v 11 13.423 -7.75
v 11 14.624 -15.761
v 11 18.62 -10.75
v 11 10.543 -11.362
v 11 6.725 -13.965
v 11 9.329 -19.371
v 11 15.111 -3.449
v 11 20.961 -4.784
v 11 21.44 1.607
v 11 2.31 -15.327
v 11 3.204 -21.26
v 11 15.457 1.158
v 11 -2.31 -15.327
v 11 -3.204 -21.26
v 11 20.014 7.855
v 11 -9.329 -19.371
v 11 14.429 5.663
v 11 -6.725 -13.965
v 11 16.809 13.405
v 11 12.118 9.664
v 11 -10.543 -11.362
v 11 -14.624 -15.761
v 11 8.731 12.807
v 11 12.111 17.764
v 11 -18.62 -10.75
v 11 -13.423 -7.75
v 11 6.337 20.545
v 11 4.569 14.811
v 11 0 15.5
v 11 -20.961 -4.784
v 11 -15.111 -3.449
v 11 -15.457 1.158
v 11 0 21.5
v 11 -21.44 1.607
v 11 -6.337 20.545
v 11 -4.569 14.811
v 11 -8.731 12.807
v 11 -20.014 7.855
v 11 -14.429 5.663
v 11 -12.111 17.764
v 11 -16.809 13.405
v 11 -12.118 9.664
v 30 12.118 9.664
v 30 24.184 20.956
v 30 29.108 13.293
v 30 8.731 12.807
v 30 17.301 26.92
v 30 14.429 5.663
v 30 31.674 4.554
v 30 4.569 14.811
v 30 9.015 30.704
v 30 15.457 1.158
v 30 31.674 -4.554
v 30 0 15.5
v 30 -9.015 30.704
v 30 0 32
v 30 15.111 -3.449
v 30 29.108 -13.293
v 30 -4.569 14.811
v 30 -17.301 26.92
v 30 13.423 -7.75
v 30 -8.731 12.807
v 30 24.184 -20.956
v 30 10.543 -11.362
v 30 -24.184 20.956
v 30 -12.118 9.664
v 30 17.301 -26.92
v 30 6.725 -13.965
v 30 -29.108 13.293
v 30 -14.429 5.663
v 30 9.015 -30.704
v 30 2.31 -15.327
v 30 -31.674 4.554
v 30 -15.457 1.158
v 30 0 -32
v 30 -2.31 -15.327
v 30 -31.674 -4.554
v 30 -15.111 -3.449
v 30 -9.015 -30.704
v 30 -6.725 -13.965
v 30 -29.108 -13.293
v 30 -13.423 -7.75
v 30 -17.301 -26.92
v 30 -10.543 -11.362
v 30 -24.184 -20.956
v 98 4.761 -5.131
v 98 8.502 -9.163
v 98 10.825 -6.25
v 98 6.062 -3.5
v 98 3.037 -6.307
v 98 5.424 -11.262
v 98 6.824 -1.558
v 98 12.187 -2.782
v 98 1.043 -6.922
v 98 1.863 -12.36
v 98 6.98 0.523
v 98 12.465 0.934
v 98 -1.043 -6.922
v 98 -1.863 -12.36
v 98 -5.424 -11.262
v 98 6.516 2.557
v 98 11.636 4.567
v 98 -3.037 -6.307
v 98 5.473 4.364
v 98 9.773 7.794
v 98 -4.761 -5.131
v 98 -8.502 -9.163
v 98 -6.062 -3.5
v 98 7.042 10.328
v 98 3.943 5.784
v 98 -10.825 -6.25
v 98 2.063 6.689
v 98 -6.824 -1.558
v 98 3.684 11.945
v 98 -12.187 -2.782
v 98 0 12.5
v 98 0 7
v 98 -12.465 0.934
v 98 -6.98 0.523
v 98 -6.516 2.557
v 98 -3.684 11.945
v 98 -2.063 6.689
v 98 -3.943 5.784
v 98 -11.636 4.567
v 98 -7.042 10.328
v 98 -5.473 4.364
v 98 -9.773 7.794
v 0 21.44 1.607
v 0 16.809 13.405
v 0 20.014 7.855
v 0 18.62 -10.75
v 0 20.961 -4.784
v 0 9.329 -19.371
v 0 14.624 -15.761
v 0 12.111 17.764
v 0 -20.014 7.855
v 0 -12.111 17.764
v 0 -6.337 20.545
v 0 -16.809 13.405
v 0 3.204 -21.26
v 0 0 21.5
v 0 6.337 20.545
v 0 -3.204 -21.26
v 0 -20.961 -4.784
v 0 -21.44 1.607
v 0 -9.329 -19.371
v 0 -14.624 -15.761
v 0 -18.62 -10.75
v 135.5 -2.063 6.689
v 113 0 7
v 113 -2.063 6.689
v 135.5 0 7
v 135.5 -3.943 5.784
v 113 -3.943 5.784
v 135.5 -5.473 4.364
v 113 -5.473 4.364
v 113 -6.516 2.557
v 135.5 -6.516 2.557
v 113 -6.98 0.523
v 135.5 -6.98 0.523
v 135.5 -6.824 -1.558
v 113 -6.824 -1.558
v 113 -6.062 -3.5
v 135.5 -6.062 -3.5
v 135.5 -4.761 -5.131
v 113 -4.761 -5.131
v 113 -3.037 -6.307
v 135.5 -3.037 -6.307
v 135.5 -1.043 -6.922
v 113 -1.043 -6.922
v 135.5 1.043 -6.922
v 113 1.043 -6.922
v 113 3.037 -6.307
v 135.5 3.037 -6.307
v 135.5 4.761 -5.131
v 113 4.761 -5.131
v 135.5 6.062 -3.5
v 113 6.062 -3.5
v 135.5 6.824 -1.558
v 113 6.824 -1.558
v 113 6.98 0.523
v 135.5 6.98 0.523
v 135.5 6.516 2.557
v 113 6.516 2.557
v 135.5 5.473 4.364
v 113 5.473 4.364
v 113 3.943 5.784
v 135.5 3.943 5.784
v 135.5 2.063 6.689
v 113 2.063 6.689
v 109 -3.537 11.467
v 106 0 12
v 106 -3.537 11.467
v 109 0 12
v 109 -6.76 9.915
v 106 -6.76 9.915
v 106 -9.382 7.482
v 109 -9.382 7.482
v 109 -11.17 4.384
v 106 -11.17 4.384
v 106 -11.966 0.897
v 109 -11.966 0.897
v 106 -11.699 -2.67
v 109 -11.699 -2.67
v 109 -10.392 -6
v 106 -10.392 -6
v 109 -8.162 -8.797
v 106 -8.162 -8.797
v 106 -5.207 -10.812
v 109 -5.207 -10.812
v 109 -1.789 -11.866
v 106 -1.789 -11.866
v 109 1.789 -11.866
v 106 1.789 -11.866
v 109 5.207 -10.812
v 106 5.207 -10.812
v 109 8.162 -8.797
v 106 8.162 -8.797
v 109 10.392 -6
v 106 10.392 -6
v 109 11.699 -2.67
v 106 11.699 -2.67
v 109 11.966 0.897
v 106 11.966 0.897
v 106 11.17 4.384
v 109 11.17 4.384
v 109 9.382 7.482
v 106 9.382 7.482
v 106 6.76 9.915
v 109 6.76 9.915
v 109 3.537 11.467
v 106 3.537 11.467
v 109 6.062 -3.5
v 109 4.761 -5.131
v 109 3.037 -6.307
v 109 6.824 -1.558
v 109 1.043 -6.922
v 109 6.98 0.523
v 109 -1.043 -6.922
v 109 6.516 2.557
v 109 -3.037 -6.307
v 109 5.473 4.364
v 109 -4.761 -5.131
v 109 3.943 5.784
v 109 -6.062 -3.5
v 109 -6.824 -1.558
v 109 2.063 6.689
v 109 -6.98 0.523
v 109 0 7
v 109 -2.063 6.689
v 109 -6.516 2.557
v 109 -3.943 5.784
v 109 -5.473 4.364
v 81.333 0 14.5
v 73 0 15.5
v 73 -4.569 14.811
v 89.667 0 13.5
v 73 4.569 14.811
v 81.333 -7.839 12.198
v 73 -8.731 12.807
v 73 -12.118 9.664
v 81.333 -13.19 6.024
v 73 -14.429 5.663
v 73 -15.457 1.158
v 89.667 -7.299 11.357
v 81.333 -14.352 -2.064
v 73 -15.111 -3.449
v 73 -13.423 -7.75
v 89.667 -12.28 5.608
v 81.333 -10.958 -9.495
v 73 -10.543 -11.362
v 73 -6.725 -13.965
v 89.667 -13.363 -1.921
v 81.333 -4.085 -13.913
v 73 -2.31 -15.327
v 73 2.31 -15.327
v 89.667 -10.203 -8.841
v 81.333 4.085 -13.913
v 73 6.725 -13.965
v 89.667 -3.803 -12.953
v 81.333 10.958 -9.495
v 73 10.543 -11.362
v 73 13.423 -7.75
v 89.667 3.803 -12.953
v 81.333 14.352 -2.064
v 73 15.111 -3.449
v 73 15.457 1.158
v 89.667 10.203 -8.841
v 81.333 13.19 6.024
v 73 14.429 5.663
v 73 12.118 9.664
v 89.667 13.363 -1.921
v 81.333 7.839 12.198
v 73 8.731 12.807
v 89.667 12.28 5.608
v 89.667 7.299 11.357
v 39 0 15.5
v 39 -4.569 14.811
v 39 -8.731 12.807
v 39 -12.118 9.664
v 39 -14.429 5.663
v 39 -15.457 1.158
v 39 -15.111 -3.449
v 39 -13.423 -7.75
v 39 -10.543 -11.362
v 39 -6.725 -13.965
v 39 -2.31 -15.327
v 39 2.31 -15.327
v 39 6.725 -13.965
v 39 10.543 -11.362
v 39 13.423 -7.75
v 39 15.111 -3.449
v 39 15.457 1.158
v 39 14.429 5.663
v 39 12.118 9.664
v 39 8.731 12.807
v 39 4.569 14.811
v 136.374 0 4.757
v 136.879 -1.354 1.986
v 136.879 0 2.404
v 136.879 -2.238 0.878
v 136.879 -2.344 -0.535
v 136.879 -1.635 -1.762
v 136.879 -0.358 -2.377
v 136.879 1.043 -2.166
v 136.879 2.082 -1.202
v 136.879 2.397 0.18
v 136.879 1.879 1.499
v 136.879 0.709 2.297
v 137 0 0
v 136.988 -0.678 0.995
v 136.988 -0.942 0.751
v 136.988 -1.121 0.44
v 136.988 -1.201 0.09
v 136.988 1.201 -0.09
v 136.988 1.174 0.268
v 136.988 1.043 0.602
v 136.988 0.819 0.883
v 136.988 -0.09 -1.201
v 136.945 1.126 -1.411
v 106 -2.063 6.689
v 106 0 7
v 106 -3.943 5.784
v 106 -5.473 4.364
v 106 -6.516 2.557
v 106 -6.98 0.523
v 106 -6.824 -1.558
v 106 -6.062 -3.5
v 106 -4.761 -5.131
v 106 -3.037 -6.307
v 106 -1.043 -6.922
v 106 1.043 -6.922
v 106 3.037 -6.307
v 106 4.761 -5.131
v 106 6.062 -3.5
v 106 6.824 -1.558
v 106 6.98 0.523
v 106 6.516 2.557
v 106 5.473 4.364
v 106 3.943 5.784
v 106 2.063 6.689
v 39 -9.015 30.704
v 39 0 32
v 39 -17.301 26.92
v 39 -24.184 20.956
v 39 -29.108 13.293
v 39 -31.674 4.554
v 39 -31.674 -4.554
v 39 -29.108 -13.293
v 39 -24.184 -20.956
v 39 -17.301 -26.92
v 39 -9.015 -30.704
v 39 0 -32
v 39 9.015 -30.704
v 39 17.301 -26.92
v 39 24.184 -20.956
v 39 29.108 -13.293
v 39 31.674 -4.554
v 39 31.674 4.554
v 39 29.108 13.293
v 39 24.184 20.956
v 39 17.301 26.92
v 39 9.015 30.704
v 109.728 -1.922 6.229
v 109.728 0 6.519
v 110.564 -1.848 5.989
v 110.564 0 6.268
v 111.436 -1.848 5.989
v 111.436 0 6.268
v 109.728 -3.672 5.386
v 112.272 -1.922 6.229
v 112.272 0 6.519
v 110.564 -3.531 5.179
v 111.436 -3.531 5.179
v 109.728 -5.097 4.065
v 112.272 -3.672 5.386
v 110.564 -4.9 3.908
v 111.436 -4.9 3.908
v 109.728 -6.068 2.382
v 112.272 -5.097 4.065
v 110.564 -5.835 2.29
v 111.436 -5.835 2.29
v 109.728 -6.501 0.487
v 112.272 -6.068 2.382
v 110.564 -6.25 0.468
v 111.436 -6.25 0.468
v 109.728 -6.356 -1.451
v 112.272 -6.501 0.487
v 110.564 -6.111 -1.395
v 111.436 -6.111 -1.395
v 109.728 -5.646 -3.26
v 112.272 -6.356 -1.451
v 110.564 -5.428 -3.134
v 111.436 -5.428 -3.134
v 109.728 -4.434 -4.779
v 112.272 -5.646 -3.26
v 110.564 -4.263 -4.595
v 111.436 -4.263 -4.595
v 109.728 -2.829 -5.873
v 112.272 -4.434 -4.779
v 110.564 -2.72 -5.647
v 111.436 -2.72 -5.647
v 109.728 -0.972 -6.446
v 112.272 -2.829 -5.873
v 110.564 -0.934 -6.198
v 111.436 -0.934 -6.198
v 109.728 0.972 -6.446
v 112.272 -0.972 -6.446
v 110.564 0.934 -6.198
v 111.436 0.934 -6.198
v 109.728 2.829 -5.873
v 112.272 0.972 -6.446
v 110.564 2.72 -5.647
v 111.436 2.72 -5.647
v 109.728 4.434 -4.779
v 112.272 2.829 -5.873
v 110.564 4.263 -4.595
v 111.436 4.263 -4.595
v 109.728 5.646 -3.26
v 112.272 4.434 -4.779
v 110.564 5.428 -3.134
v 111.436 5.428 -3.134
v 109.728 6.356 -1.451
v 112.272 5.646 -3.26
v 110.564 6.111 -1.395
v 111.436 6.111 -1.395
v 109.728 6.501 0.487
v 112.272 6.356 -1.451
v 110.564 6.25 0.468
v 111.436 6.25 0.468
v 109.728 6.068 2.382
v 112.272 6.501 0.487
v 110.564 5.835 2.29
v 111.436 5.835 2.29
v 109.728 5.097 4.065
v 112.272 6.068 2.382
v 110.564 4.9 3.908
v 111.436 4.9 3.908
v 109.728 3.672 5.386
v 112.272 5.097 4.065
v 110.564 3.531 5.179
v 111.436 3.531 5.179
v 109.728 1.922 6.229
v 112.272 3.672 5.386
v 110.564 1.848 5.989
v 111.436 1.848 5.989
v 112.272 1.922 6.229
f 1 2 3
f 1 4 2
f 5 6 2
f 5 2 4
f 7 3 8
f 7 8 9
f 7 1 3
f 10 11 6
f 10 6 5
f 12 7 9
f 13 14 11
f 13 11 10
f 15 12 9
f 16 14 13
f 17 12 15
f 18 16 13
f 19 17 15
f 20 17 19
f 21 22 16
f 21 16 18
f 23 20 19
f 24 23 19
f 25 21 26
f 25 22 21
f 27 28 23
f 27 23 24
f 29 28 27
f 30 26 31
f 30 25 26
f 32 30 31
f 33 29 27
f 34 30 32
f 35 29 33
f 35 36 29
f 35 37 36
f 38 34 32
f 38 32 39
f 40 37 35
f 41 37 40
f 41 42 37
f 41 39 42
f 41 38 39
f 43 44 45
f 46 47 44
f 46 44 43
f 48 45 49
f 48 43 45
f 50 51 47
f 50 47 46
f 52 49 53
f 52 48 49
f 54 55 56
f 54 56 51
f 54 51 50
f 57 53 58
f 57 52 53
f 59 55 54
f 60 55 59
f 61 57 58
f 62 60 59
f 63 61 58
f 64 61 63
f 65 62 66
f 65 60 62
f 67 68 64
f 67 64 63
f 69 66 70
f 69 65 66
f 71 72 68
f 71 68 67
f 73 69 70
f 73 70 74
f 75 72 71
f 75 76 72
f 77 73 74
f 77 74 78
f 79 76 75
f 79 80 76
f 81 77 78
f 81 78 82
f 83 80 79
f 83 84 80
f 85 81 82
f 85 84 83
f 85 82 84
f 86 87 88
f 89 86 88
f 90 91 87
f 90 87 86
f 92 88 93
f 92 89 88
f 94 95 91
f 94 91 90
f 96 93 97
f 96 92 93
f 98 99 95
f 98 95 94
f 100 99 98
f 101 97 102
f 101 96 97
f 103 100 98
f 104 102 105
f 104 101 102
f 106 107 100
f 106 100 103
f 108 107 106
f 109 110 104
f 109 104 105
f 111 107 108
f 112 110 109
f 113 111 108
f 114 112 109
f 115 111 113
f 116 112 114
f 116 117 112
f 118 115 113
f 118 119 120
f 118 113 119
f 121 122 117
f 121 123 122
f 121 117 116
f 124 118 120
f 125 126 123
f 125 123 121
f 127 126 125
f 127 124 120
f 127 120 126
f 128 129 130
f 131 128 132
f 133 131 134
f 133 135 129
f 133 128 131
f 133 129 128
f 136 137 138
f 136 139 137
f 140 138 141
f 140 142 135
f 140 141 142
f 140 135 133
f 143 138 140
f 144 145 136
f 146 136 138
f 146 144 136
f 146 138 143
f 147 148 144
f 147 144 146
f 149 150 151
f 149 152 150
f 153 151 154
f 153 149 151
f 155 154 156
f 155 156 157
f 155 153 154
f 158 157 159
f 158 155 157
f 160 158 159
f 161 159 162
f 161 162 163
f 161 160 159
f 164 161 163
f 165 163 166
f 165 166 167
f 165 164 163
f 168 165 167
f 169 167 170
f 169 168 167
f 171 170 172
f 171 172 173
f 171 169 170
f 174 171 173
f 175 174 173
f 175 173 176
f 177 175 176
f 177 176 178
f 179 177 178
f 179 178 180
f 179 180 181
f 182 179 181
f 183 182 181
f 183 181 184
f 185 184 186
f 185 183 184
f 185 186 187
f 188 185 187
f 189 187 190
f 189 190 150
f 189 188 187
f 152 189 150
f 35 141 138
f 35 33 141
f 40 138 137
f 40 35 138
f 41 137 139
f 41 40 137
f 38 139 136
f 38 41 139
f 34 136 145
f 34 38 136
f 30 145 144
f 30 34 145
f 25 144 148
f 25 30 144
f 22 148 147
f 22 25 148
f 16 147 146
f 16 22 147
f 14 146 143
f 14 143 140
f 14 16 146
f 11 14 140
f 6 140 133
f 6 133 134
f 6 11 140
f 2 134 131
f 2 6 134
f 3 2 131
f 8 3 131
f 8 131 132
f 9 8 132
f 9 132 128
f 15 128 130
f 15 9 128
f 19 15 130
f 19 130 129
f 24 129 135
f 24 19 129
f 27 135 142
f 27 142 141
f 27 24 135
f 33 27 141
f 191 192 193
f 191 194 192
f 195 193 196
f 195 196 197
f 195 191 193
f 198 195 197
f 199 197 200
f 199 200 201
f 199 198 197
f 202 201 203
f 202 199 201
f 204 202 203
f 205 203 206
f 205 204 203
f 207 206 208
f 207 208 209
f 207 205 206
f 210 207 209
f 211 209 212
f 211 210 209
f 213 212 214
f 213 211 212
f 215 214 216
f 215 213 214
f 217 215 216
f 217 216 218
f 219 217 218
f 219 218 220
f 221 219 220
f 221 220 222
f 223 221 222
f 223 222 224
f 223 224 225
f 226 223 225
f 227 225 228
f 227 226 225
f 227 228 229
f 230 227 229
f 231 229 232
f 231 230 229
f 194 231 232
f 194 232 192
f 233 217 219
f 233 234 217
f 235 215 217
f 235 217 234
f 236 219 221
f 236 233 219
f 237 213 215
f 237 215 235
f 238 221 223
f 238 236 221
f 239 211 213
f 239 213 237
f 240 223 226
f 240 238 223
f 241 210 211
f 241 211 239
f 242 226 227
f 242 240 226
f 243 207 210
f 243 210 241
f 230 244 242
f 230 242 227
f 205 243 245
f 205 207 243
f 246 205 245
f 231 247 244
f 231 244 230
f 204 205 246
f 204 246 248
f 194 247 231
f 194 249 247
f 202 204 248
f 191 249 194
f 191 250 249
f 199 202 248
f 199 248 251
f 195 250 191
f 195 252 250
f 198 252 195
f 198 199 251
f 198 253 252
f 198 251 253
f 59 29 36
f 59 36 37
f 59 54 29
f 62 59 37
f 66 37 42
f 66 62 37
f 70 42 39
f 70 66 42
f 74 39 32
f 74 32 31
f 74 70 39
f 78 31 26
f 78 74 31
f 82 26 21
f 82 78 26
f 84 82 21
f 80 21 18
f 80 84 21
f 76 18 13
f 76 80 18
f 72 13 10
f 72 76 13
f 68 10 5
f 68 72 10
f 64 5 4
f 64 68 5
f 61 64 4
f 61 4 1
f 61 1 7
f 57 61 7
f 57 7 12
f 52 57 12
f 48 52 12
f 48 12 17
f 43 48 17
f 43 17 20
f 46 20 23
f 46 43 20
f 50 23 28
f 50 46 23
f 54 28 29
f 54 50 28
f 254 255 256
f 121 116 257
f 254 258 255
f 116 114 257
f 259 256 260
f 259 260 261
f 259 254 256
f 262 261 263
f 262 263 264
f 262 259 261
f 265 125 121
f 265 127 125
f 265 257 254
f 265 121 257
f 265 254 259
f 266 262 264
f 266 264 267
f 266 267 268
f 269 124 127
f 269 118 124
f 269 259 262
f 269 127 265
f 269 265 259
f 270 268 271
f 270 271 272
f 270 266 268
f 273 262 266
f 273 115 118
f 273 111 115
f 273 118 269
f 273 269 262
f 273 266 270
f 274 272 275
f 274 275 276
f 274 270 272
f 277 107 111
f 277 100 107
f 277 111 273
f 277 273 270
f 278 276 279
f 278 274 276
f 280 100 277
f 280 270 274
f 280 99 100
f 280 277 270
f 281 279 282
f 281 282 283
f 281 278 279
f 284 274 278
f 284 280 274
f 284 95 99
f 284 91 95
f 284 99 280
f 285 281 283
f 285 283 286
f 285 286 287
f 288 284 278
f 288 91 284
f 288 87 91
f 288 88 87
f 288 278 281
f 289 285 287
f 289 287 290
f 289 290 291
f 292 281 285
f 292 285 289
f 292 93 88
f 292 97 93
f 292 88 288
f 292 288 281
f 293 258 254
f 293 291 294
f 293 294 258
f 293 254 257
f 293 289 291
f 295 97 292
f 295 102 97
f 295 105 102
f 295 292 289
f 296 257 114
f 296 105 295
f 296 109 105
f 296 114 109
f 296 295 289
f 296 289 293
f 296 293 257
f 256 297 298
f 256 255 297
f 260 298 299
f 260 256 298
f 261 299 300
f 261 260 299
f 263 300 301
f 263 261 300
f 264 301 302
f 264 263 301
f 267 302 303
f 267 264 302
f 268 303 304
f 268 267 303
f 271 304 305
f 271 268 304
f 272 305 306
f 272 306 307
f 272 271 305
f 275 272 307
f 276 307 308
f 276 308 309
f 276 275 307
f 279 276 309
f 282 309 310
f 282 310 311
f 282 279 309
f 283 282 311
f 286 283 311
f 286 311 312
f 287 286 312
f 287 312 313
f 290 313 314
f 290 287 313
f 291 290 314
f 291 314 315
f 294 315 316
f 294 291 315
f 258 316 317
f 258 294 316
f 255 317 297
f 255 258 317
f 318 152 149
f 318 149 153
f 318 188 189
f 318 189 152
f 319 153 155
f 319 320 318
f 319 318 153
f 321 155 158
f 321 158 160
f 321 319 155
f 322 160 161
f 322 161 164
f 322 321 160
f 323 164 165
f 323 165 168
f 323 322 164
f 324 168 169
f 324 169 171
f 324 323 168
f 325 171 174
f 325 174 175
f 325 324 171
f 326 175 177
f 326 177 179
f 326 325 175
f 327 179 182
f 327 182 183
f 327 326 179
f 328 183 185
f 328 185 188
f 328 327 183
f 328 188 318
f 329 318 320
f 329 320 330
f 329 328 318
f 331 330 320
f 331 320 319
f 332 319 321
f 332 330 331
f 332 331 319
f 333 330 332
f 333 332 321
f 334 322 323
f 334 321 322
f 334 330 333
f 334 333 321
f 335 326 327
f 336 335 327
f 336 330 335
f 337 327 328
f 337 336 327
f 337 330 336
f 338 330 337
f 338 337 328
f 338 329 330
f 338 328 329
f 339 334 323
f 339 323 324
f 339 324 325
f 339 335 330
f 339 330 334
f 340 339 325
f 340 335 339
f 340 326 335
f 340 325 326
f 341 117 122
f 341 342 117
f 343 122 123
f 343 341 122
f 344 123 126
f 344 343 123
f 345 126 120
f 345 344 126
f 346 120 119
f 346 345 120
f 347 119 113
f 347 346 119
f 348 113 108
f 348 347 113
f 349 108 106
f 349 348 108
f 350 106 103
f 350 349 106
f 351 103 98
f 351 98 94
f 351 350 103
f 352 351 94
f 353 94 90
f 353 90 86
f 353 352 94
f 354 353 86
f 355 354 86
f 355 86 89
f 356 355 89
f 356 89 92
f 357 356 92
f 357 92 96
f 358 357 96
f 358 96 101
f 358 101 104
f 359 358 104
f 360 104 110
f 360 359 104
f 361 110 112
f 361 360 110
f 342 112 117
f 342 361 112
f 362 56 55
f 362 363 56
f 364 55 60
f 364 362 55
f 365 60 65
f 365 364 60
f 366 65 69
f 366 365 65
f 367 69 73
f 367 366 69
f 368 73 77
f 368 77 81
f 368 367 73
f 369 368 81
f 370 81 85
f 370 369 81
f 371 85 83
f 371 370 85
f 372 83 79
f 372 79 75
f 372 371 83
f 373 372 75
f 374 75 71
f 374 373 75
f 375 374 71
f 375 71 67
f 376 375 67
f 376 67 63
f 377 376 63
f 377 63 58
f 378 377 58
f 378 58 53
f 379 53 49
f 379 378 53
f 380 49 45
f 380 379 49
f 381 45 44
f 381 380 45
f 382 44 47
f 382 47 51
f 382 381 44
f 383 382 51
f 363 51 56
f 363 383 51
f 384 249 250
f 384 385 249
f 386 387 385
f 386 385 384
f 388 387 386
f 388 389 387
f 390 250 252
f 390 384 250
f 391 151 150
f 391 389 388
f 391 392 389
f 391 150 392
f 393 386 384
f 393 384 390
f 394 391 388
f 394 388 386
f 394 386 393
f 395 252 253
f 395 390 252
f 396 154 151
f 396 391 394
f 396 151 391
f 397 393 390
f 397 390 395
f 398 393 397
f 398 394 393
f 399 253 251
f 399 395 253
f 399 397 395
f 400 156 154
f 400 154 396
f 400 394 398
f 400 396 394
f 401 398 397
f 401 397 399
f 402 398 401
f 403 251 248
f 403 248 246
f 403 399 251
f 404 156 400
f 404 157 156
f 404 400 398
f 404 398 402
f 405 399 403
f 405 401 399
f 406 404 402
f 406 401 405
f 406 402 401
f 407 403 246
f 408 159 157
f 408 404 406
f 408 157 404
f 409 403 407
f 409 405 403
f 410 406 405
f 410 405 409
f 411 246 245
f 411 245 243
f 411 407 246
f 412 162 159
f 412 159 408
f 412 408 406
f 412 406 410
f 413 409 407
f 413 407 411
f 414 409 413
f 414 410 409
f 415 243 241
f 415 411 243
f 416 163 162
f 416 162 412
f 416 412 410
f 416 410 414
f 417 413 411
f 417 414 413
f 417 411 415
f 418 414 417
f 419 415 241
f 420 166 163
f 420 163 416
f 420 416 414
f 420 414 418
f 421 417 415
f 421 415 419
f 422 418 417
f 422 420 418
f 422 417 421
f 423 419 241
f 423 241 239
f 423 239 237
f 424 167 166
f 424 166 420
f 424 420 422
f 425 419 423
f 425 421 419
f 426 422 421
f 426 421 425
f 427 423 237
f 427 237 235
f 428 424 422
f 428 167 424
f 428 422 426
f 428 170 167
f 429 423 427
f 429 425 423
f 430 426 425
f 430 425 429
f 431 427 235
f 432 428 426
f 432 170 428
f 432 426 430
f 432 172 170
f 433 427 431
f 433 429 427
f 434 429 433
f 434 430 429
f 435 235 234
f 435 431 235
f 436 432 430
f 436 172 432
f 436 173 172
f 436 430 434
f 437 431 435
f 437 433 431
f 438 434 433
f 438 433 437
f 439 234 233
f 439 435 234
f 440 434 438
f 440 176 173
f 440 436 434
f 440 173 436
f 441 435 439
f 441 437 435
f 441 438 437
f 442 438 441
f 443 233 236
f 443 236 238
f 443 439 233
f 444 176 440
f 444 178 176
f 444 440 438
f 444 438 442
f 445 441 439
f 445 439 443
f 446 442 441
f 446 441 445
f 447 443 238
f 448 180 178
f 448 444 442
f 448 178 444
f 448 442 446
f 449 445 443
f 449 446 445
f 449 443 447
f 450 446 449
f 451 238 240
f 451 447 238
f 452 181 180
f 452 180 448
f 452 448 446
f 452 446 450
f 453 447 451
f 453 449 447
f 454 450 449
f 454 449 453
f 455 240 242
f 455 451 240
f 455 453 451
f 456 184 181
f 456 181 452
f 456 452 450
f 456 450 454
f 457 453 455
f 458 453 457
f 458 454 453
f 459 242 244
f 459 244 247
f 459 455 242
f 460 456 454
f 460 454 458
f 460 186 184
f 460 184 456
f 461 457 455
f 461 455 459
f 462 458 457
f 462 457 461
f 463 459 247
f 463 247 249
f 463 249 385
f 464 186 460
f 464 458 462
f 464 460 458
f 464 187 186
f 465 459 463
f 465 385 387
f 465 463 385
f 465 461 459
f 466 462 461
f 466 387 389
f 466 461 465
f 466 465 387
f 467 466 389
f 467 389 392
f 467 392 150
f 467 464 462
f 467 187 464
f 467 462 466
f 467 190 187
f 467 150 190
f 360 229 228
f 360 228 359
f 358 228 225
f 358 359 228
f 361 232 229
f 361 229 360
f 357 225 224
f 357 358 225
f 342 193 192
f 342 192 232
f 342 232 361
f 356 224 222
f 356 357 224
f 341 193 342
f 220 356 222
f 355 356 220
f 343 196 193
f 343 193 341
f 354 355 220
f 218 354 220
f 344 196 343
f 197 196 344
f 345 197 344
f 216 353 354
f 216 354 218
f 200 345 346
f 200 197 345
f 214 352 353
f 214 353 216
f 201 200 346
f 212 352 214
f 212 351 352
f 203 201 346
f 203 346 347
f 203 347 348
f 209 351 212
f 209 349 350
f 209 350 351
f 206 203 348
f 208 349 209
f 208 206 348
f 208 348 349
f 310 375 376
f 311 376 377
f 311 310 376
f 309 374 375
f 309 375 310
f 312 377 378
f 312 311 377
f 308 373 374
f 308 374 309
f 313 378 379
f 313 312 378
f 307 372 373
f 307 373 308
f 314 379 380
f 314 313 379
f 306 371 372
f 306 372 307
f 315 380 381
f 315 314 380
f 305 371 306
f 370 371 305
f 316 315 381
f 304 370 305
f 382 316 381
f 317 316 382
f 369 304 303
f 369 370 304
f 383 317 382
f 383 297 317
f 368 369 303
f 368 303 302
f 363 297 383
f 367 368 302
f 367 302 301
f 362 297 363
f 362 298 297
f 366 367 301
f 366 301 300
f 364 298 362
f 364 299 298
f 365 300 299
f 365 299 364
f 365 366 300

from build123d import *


with BuildPart() as part:
    # Çizim1 → Döndür2 (revolve)
    with BuildSketch(Plane.XY, mode=Mode.PRIVATE) as d_nd_r2_sk:
        with BuildLine():
            Line((0, 0), (0, 21.5))
            Line((0, 21.5), (11, 21.5))
            Line((11, 21.5), (11, 15.5))
            Line((11, 15.5), (30, 15.5))
            Line((30, 15.5), (30, 32))
            Line((30, 32), (39, 32))
            Line((39, 32), (39, 15.5))
            Line((39, 15.5), (73, 15.5))
            Line((73, 15.5), (98, 12.5))
            Line((98, 12.5), (98, 7))
            Line((98, 7), (106, 7))
            Line((106, 7), (106, 12))
            Line((106, 12), (109, 12))
            Line((109, 12), (109, 7))
            ThreePointArc((109, 7), (111, 6.236067977), (113, 7))
            Line((113, 7), (135.5, 7))
            ThreePointArc((135.5, 7), (136.673723702, 3.590797936), (137, 0))
            Line((137, 0), (0, 0))
        make_face()
    revolve(d_nd_r2_sk.sketch.rotate(Axis((0, 0, 0), (1, 0, 0)), 90), axis=Axis((0, 0, 0), (1, 0, 0)))


solid = part.part
